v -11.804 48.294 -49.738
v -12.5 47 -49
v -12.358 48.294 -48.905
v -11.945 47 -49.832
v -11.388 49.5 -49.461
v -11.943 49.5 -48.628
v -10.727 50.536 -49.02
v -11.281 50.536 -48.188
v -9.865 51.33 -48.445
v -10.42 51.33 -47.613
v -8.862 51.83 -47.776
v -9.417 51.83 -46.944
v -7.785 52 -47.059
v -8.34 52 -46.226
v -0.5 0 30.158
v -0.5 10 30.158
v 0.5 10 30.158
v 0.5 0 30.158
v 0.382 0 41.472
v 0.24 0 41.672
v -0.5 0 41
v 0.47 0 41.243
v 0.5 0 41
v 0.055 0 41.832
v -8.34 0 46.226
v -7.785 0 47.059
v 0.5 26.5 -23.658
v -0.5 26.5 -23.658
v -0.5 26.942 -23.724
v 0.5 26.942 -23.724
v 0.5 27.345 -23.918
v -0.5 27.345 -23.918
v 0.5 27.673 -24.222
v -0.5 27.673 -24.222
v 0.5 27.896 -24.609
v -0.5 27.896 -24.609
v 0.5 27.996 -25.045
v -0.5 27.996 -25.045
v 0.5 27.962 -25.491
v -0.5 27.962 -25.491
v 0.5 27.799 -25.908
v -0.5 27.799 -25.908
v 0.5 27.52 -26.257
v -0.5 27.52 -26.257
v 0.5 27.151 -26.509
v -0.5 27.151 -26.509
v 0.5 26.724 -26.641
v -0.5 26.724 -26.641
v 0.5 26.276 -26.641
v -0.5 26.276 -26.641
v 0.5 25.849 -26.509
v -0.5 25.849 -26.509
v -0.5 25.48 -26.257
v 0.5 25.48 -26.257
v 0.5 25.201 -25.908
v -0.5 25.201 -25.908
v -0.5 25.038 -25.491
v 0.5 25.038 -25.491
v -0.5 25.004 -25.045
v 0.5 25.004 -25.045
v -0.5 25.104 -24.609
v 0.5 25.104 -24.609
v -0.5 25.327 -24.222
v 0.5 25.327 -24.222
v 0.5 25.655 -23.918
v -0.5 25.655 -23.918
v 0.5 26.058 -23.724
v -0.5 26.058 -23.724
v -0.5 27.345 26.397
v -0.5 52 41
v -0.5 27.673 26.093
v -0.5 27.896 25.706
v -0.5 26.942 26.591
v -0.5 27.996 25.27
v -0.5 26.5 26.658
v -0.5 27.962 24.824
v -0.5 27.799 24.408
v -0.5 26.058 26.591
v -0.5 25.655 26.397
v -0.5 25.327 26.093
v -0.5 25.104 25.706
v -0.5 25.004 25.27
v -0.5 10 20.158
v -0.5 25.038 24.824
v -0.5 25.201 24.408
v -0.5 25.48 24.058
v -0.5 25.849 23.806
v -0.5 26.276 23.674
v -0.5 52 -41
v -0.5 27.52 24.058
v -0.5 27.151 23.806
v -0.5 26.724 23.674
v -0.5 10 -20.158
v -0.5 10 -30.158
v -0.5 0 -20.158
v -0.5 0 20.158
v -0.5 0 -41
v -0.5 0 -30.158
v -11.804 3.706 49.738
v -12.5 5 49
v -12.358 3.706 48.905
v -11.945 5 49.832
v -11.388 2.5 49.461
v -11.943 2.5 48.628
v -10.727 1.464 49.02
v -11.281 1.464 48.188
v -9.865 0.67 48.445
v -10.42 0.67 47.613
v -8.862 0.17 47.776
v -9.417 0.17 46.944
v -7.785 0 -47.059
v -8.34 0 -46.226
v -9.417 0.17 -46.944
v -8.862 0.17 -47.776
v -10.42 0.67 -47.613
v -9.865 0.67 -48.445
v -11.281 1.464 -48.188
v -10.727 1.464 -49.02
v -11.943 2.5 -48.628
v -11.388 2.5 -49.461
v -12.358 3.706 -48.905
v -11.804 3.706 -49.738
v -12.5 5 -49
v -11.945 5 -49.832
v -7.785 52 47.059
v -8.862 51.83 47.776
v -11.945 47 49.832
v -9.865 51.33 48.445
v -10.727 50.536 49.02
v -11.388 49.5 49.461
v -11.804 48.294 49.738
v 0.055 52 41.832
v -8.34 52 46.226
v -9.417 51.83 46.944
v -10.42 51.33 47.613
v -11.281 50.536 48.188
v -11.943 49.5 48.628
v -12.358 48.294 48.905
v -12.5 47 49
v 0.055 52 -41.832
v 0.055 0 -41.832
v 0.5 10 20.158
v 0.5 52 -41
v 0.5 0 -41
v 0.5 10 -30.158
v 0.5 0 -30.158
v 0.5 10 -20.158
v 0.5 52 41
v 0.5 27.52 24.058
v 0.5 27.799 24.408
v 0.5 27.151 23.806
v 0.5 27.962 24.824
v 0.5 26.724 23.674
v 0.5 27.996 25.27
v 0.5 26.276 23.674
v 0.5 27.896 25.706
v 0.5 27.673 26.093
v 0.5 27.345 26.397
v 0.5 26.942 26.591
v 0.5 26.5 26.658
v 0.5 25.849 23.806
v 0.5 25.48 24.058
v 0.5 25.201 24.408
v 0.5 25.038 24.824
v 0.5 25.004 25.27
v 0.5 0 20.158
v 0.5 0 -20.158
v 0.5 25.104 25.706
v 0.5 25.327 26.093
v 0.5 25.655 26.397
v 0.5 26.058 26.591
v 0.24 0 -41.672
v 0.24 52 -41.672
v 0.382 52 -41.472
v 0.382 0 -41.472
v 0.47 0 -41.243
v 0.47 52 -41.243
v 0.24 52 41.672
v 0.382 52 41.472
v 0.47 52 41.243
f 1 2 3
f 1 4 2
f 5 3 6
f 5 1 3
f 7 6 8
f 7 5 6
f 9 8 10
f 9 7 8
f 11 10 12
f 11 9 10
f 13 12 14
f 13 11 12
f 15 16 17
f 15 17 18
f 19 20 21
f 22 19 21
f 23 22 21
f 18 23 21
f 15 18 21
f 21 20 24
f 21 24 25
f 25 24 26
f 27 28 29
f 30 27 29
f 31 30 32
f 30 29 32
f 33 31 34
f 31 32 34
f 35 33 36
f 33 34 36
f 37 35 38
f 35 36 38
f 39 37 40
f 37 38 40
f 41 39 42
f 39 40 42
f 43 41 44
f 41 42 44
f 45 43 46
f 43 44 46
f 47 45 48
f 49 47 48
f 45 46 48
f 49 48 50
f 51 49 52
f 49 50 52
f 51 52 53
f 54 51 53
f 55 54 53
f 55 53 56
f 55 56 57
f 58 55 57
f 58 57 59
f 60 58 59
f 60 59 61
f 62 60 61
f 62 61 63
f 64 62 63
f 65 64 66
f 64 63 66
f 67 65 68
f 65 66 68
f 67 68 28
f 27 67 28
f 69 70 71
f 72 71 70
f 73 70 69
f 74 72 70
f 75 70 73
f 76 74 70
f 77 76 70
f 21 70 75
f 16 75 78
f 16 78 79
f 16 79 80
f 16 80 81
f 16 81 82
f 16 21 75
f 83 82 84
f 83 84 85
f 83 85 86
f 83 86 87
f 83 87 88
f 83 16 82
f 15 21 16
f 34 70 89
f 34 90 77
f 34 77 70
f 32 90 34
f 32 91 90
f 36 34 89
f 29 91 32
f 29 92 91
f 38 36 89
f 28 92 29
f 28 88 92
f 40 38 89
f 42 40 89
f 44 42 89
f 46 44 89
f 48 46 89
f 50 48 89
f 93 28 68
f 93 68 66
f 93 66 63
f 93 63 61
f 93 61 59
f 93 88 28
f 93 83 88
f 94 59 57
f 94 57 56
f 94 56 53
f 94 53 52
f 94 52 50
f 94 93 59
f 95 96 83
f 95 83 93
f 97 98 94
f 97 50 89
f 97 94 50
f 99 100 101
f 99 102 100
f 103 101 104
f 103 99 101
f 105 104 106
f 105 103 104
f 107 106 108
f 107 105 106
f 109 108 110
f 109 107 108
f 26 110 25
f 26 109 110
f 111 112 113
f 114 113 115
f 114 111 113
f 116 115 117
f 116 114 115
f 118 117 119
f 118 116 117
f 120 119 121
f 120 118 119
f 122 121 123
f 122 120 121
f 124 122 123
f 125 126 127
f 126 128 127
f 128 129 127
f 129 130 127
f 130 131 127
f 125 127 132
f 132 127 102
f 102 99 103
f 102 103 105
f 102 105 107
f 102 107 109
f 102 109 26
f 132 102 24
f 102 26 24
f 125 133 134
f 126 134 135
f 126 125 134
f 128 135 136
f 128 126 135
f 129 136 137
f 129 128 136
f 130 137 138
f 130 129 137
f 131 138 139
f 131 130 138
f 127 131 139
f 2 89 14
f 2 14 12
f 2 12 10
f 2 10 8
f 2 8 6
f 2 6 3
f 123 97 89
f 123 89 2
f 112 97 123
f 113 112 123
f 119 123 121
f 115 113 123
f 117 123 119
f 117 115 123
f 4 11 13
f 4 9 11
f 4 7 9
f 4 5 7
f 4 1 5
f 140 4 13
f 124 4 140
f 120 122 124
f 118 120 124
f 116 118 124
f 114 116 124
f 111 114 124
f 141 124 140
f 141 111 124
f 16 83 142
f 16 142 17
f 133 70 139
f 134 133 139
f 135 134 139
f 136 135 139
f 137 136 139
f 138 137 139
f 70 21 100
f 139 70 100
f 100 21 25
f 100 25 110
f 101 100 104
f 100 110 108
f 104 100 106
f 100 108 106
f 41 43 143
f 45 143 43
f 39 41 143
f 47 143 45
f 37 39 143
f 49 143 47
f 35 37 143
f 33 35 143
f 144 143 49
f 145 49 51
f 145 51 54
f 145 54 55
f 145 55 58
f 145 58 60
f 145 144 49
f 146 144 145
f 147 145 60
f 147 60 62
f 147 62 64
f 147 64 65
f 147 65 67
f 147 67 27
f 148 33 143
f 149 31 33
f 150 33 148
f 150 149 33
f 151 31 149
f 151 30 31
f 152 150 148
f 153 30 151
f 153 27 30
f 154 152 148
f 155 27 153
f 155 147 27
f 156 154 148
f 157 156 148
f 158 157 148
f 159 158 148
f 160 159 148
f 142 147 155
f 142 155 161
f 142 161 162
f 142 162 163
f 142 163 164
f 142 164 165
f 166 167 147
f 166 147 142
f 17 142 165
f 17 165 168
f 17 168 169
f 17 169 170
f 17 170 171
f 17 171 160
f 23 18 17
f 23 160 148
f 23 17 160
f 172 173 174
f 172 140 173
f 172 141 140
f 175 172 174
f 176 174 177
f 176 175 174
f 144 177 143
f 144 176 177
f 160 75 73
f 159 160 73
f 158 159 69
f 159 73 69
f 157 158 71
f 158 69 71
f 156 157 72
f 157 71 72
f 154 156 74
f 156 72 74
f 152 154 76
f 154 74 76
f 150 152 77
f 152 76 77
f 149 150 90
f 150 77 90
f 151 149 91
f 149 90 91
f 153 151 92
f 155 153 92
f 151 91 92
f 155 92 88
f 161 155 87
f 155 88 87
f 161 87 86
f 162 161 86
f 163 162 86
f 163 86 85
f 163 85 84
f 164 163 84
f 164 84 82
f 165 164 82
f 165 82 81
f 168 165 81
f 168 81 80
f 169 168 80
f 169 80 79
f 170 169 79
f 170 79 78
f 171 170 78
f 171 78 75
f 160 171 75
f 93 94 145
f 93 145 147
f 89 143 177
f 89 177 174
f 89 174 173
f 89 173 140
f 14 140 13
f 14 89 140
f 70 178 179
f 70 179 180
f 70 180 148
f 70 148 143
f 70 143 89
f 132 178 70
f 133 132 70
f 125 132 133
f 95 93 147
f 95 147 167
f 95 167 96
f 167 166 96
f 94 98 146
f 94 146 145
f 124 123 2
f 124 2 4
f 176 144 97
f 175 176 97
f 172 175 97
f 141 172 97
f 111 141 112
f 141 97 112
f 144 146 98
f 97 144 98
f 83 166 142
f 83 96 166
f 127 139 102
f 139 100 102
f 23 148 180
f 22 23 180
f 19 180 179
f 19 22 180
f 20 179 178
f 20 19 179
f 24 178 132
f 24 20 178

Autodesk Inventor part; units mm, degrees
ref_plane "YZ Plane" through (0, 0, 0) normal (1, 0, 0) x (0, 1, 0)
ref_plane "XZ Plane" through (0, 0, 0) normal (0, 1, 0) x (-1, 0, 0)
ref_plane "XY Plane" through (0, 0, 0) normal (0, 0, 1) x (1, 0, 0)
sketch "Sketch1" plane through (0, 0, 0) normal (0, 1, 0) x (-1, 0, 0)
  line L0 (0.5, 41) -> (12.5, 49)
  line L1 (0.5, 41) -> (12.5, 49)
  line L2 (12.5, 49) -> (11.9453, 49.8321)
  line L3 (11.9453, 49.8321) -> (-0.0547, 41.8321)
  arc A0 (-0.0547, 41.8321) -> (-0.5, 41) centre (0.5, 41) ccw
  line L4 (0.5, 41) -> (0.5, 0)
  line L5 (0.5, 0) -> (-0.5, 0)
  line L6 (-0.5, 0) -> (-0.5, 41)
  line L7 (0.5, -41) -> (12.5, -49)
  line L8 (12.5, -49) -> (11.9453, -49.8321)
  line L9 (11.9453, -49.8321) -> (-0.0547, -41.8321)
  arc A1 (-0.5, -41) -> (-0.0547, -41.8321) centre (0.5, -41) ccw
  line L10 (0.5, -41) -> (0.5, 0)
  line L11 (-0.5, 0) -> (-0.5, -41)
  point P0 (0, 0)
  dimension "d0" = 1
  dimension "d4" = 1
extrude "Extrusion1" add sketch "Sketch1" along normal blind 52
sketch "Sketch2" plane through (-0.5, 0, -41) normal (-1, 0, 0) x (0, 0, 1)
  circle A0 centre (15.8425, 26.5) radius 1.5
  circle A1 centre (66.1575, 26.5) radius 1.5
  line L0 (15.8425, 26.5) -> (15.8425, 0)
  line L1 (82, 0) -> (0, 0) projected
  line L2 (66.1575, 26.5) -> (66.1575, 0)
  line L3 (15.8425, 0) -> (20.8425, 0)
  line L4 (66.1575, 0) -> (71.1575, 0)
  line L5 (71.1575, 0) -> (61.1575, 0)
  line L6 (61.1575, 0) -> (61.1575, 10)
  line L7 (61.1575, 10) -> (71.1575, 10)
  line L8 (71.1575, 10) -> (71.1575, 0)
  line L9 (20.8425, 0) -> (10.8425, 0)
  line L10 (10.8425, 0) -> (10.8425, 10)
  line L11 (10.8425, 10) -> (20.8425, 10)
  line L12 (20.8425, 10) -> (20.8425, 0)
  dimension "d10" = 3
  dimension "d11" = 3
  dimension "d14" = 5
  dimension "d15" = 5
  dimension "d16" = 10
  dimension "d17" = 10
  dimension "d18" = 10
  dimension "d19" = 10
extrude "Extrusion2" cut sketch "Sketch2" against normal blind 1 contours A0 | A1
extrude "Extrusion3" cut sketch "Sketch2" against normal blind 1 contours L6 L7 L2 L1 | L11 L12 L1 L0 | L0 L1 L10 L11 | L2 L7 L8 L1
fillet "Fillet1" radius 5 4 edges at (-12.2226, 0, 49.416) (-12.2226, 52, 49.416) (-12.2226, 52, -49.416) (-12.2226, 0, -49.416)
properties part number "podpera_deska_rameno"
